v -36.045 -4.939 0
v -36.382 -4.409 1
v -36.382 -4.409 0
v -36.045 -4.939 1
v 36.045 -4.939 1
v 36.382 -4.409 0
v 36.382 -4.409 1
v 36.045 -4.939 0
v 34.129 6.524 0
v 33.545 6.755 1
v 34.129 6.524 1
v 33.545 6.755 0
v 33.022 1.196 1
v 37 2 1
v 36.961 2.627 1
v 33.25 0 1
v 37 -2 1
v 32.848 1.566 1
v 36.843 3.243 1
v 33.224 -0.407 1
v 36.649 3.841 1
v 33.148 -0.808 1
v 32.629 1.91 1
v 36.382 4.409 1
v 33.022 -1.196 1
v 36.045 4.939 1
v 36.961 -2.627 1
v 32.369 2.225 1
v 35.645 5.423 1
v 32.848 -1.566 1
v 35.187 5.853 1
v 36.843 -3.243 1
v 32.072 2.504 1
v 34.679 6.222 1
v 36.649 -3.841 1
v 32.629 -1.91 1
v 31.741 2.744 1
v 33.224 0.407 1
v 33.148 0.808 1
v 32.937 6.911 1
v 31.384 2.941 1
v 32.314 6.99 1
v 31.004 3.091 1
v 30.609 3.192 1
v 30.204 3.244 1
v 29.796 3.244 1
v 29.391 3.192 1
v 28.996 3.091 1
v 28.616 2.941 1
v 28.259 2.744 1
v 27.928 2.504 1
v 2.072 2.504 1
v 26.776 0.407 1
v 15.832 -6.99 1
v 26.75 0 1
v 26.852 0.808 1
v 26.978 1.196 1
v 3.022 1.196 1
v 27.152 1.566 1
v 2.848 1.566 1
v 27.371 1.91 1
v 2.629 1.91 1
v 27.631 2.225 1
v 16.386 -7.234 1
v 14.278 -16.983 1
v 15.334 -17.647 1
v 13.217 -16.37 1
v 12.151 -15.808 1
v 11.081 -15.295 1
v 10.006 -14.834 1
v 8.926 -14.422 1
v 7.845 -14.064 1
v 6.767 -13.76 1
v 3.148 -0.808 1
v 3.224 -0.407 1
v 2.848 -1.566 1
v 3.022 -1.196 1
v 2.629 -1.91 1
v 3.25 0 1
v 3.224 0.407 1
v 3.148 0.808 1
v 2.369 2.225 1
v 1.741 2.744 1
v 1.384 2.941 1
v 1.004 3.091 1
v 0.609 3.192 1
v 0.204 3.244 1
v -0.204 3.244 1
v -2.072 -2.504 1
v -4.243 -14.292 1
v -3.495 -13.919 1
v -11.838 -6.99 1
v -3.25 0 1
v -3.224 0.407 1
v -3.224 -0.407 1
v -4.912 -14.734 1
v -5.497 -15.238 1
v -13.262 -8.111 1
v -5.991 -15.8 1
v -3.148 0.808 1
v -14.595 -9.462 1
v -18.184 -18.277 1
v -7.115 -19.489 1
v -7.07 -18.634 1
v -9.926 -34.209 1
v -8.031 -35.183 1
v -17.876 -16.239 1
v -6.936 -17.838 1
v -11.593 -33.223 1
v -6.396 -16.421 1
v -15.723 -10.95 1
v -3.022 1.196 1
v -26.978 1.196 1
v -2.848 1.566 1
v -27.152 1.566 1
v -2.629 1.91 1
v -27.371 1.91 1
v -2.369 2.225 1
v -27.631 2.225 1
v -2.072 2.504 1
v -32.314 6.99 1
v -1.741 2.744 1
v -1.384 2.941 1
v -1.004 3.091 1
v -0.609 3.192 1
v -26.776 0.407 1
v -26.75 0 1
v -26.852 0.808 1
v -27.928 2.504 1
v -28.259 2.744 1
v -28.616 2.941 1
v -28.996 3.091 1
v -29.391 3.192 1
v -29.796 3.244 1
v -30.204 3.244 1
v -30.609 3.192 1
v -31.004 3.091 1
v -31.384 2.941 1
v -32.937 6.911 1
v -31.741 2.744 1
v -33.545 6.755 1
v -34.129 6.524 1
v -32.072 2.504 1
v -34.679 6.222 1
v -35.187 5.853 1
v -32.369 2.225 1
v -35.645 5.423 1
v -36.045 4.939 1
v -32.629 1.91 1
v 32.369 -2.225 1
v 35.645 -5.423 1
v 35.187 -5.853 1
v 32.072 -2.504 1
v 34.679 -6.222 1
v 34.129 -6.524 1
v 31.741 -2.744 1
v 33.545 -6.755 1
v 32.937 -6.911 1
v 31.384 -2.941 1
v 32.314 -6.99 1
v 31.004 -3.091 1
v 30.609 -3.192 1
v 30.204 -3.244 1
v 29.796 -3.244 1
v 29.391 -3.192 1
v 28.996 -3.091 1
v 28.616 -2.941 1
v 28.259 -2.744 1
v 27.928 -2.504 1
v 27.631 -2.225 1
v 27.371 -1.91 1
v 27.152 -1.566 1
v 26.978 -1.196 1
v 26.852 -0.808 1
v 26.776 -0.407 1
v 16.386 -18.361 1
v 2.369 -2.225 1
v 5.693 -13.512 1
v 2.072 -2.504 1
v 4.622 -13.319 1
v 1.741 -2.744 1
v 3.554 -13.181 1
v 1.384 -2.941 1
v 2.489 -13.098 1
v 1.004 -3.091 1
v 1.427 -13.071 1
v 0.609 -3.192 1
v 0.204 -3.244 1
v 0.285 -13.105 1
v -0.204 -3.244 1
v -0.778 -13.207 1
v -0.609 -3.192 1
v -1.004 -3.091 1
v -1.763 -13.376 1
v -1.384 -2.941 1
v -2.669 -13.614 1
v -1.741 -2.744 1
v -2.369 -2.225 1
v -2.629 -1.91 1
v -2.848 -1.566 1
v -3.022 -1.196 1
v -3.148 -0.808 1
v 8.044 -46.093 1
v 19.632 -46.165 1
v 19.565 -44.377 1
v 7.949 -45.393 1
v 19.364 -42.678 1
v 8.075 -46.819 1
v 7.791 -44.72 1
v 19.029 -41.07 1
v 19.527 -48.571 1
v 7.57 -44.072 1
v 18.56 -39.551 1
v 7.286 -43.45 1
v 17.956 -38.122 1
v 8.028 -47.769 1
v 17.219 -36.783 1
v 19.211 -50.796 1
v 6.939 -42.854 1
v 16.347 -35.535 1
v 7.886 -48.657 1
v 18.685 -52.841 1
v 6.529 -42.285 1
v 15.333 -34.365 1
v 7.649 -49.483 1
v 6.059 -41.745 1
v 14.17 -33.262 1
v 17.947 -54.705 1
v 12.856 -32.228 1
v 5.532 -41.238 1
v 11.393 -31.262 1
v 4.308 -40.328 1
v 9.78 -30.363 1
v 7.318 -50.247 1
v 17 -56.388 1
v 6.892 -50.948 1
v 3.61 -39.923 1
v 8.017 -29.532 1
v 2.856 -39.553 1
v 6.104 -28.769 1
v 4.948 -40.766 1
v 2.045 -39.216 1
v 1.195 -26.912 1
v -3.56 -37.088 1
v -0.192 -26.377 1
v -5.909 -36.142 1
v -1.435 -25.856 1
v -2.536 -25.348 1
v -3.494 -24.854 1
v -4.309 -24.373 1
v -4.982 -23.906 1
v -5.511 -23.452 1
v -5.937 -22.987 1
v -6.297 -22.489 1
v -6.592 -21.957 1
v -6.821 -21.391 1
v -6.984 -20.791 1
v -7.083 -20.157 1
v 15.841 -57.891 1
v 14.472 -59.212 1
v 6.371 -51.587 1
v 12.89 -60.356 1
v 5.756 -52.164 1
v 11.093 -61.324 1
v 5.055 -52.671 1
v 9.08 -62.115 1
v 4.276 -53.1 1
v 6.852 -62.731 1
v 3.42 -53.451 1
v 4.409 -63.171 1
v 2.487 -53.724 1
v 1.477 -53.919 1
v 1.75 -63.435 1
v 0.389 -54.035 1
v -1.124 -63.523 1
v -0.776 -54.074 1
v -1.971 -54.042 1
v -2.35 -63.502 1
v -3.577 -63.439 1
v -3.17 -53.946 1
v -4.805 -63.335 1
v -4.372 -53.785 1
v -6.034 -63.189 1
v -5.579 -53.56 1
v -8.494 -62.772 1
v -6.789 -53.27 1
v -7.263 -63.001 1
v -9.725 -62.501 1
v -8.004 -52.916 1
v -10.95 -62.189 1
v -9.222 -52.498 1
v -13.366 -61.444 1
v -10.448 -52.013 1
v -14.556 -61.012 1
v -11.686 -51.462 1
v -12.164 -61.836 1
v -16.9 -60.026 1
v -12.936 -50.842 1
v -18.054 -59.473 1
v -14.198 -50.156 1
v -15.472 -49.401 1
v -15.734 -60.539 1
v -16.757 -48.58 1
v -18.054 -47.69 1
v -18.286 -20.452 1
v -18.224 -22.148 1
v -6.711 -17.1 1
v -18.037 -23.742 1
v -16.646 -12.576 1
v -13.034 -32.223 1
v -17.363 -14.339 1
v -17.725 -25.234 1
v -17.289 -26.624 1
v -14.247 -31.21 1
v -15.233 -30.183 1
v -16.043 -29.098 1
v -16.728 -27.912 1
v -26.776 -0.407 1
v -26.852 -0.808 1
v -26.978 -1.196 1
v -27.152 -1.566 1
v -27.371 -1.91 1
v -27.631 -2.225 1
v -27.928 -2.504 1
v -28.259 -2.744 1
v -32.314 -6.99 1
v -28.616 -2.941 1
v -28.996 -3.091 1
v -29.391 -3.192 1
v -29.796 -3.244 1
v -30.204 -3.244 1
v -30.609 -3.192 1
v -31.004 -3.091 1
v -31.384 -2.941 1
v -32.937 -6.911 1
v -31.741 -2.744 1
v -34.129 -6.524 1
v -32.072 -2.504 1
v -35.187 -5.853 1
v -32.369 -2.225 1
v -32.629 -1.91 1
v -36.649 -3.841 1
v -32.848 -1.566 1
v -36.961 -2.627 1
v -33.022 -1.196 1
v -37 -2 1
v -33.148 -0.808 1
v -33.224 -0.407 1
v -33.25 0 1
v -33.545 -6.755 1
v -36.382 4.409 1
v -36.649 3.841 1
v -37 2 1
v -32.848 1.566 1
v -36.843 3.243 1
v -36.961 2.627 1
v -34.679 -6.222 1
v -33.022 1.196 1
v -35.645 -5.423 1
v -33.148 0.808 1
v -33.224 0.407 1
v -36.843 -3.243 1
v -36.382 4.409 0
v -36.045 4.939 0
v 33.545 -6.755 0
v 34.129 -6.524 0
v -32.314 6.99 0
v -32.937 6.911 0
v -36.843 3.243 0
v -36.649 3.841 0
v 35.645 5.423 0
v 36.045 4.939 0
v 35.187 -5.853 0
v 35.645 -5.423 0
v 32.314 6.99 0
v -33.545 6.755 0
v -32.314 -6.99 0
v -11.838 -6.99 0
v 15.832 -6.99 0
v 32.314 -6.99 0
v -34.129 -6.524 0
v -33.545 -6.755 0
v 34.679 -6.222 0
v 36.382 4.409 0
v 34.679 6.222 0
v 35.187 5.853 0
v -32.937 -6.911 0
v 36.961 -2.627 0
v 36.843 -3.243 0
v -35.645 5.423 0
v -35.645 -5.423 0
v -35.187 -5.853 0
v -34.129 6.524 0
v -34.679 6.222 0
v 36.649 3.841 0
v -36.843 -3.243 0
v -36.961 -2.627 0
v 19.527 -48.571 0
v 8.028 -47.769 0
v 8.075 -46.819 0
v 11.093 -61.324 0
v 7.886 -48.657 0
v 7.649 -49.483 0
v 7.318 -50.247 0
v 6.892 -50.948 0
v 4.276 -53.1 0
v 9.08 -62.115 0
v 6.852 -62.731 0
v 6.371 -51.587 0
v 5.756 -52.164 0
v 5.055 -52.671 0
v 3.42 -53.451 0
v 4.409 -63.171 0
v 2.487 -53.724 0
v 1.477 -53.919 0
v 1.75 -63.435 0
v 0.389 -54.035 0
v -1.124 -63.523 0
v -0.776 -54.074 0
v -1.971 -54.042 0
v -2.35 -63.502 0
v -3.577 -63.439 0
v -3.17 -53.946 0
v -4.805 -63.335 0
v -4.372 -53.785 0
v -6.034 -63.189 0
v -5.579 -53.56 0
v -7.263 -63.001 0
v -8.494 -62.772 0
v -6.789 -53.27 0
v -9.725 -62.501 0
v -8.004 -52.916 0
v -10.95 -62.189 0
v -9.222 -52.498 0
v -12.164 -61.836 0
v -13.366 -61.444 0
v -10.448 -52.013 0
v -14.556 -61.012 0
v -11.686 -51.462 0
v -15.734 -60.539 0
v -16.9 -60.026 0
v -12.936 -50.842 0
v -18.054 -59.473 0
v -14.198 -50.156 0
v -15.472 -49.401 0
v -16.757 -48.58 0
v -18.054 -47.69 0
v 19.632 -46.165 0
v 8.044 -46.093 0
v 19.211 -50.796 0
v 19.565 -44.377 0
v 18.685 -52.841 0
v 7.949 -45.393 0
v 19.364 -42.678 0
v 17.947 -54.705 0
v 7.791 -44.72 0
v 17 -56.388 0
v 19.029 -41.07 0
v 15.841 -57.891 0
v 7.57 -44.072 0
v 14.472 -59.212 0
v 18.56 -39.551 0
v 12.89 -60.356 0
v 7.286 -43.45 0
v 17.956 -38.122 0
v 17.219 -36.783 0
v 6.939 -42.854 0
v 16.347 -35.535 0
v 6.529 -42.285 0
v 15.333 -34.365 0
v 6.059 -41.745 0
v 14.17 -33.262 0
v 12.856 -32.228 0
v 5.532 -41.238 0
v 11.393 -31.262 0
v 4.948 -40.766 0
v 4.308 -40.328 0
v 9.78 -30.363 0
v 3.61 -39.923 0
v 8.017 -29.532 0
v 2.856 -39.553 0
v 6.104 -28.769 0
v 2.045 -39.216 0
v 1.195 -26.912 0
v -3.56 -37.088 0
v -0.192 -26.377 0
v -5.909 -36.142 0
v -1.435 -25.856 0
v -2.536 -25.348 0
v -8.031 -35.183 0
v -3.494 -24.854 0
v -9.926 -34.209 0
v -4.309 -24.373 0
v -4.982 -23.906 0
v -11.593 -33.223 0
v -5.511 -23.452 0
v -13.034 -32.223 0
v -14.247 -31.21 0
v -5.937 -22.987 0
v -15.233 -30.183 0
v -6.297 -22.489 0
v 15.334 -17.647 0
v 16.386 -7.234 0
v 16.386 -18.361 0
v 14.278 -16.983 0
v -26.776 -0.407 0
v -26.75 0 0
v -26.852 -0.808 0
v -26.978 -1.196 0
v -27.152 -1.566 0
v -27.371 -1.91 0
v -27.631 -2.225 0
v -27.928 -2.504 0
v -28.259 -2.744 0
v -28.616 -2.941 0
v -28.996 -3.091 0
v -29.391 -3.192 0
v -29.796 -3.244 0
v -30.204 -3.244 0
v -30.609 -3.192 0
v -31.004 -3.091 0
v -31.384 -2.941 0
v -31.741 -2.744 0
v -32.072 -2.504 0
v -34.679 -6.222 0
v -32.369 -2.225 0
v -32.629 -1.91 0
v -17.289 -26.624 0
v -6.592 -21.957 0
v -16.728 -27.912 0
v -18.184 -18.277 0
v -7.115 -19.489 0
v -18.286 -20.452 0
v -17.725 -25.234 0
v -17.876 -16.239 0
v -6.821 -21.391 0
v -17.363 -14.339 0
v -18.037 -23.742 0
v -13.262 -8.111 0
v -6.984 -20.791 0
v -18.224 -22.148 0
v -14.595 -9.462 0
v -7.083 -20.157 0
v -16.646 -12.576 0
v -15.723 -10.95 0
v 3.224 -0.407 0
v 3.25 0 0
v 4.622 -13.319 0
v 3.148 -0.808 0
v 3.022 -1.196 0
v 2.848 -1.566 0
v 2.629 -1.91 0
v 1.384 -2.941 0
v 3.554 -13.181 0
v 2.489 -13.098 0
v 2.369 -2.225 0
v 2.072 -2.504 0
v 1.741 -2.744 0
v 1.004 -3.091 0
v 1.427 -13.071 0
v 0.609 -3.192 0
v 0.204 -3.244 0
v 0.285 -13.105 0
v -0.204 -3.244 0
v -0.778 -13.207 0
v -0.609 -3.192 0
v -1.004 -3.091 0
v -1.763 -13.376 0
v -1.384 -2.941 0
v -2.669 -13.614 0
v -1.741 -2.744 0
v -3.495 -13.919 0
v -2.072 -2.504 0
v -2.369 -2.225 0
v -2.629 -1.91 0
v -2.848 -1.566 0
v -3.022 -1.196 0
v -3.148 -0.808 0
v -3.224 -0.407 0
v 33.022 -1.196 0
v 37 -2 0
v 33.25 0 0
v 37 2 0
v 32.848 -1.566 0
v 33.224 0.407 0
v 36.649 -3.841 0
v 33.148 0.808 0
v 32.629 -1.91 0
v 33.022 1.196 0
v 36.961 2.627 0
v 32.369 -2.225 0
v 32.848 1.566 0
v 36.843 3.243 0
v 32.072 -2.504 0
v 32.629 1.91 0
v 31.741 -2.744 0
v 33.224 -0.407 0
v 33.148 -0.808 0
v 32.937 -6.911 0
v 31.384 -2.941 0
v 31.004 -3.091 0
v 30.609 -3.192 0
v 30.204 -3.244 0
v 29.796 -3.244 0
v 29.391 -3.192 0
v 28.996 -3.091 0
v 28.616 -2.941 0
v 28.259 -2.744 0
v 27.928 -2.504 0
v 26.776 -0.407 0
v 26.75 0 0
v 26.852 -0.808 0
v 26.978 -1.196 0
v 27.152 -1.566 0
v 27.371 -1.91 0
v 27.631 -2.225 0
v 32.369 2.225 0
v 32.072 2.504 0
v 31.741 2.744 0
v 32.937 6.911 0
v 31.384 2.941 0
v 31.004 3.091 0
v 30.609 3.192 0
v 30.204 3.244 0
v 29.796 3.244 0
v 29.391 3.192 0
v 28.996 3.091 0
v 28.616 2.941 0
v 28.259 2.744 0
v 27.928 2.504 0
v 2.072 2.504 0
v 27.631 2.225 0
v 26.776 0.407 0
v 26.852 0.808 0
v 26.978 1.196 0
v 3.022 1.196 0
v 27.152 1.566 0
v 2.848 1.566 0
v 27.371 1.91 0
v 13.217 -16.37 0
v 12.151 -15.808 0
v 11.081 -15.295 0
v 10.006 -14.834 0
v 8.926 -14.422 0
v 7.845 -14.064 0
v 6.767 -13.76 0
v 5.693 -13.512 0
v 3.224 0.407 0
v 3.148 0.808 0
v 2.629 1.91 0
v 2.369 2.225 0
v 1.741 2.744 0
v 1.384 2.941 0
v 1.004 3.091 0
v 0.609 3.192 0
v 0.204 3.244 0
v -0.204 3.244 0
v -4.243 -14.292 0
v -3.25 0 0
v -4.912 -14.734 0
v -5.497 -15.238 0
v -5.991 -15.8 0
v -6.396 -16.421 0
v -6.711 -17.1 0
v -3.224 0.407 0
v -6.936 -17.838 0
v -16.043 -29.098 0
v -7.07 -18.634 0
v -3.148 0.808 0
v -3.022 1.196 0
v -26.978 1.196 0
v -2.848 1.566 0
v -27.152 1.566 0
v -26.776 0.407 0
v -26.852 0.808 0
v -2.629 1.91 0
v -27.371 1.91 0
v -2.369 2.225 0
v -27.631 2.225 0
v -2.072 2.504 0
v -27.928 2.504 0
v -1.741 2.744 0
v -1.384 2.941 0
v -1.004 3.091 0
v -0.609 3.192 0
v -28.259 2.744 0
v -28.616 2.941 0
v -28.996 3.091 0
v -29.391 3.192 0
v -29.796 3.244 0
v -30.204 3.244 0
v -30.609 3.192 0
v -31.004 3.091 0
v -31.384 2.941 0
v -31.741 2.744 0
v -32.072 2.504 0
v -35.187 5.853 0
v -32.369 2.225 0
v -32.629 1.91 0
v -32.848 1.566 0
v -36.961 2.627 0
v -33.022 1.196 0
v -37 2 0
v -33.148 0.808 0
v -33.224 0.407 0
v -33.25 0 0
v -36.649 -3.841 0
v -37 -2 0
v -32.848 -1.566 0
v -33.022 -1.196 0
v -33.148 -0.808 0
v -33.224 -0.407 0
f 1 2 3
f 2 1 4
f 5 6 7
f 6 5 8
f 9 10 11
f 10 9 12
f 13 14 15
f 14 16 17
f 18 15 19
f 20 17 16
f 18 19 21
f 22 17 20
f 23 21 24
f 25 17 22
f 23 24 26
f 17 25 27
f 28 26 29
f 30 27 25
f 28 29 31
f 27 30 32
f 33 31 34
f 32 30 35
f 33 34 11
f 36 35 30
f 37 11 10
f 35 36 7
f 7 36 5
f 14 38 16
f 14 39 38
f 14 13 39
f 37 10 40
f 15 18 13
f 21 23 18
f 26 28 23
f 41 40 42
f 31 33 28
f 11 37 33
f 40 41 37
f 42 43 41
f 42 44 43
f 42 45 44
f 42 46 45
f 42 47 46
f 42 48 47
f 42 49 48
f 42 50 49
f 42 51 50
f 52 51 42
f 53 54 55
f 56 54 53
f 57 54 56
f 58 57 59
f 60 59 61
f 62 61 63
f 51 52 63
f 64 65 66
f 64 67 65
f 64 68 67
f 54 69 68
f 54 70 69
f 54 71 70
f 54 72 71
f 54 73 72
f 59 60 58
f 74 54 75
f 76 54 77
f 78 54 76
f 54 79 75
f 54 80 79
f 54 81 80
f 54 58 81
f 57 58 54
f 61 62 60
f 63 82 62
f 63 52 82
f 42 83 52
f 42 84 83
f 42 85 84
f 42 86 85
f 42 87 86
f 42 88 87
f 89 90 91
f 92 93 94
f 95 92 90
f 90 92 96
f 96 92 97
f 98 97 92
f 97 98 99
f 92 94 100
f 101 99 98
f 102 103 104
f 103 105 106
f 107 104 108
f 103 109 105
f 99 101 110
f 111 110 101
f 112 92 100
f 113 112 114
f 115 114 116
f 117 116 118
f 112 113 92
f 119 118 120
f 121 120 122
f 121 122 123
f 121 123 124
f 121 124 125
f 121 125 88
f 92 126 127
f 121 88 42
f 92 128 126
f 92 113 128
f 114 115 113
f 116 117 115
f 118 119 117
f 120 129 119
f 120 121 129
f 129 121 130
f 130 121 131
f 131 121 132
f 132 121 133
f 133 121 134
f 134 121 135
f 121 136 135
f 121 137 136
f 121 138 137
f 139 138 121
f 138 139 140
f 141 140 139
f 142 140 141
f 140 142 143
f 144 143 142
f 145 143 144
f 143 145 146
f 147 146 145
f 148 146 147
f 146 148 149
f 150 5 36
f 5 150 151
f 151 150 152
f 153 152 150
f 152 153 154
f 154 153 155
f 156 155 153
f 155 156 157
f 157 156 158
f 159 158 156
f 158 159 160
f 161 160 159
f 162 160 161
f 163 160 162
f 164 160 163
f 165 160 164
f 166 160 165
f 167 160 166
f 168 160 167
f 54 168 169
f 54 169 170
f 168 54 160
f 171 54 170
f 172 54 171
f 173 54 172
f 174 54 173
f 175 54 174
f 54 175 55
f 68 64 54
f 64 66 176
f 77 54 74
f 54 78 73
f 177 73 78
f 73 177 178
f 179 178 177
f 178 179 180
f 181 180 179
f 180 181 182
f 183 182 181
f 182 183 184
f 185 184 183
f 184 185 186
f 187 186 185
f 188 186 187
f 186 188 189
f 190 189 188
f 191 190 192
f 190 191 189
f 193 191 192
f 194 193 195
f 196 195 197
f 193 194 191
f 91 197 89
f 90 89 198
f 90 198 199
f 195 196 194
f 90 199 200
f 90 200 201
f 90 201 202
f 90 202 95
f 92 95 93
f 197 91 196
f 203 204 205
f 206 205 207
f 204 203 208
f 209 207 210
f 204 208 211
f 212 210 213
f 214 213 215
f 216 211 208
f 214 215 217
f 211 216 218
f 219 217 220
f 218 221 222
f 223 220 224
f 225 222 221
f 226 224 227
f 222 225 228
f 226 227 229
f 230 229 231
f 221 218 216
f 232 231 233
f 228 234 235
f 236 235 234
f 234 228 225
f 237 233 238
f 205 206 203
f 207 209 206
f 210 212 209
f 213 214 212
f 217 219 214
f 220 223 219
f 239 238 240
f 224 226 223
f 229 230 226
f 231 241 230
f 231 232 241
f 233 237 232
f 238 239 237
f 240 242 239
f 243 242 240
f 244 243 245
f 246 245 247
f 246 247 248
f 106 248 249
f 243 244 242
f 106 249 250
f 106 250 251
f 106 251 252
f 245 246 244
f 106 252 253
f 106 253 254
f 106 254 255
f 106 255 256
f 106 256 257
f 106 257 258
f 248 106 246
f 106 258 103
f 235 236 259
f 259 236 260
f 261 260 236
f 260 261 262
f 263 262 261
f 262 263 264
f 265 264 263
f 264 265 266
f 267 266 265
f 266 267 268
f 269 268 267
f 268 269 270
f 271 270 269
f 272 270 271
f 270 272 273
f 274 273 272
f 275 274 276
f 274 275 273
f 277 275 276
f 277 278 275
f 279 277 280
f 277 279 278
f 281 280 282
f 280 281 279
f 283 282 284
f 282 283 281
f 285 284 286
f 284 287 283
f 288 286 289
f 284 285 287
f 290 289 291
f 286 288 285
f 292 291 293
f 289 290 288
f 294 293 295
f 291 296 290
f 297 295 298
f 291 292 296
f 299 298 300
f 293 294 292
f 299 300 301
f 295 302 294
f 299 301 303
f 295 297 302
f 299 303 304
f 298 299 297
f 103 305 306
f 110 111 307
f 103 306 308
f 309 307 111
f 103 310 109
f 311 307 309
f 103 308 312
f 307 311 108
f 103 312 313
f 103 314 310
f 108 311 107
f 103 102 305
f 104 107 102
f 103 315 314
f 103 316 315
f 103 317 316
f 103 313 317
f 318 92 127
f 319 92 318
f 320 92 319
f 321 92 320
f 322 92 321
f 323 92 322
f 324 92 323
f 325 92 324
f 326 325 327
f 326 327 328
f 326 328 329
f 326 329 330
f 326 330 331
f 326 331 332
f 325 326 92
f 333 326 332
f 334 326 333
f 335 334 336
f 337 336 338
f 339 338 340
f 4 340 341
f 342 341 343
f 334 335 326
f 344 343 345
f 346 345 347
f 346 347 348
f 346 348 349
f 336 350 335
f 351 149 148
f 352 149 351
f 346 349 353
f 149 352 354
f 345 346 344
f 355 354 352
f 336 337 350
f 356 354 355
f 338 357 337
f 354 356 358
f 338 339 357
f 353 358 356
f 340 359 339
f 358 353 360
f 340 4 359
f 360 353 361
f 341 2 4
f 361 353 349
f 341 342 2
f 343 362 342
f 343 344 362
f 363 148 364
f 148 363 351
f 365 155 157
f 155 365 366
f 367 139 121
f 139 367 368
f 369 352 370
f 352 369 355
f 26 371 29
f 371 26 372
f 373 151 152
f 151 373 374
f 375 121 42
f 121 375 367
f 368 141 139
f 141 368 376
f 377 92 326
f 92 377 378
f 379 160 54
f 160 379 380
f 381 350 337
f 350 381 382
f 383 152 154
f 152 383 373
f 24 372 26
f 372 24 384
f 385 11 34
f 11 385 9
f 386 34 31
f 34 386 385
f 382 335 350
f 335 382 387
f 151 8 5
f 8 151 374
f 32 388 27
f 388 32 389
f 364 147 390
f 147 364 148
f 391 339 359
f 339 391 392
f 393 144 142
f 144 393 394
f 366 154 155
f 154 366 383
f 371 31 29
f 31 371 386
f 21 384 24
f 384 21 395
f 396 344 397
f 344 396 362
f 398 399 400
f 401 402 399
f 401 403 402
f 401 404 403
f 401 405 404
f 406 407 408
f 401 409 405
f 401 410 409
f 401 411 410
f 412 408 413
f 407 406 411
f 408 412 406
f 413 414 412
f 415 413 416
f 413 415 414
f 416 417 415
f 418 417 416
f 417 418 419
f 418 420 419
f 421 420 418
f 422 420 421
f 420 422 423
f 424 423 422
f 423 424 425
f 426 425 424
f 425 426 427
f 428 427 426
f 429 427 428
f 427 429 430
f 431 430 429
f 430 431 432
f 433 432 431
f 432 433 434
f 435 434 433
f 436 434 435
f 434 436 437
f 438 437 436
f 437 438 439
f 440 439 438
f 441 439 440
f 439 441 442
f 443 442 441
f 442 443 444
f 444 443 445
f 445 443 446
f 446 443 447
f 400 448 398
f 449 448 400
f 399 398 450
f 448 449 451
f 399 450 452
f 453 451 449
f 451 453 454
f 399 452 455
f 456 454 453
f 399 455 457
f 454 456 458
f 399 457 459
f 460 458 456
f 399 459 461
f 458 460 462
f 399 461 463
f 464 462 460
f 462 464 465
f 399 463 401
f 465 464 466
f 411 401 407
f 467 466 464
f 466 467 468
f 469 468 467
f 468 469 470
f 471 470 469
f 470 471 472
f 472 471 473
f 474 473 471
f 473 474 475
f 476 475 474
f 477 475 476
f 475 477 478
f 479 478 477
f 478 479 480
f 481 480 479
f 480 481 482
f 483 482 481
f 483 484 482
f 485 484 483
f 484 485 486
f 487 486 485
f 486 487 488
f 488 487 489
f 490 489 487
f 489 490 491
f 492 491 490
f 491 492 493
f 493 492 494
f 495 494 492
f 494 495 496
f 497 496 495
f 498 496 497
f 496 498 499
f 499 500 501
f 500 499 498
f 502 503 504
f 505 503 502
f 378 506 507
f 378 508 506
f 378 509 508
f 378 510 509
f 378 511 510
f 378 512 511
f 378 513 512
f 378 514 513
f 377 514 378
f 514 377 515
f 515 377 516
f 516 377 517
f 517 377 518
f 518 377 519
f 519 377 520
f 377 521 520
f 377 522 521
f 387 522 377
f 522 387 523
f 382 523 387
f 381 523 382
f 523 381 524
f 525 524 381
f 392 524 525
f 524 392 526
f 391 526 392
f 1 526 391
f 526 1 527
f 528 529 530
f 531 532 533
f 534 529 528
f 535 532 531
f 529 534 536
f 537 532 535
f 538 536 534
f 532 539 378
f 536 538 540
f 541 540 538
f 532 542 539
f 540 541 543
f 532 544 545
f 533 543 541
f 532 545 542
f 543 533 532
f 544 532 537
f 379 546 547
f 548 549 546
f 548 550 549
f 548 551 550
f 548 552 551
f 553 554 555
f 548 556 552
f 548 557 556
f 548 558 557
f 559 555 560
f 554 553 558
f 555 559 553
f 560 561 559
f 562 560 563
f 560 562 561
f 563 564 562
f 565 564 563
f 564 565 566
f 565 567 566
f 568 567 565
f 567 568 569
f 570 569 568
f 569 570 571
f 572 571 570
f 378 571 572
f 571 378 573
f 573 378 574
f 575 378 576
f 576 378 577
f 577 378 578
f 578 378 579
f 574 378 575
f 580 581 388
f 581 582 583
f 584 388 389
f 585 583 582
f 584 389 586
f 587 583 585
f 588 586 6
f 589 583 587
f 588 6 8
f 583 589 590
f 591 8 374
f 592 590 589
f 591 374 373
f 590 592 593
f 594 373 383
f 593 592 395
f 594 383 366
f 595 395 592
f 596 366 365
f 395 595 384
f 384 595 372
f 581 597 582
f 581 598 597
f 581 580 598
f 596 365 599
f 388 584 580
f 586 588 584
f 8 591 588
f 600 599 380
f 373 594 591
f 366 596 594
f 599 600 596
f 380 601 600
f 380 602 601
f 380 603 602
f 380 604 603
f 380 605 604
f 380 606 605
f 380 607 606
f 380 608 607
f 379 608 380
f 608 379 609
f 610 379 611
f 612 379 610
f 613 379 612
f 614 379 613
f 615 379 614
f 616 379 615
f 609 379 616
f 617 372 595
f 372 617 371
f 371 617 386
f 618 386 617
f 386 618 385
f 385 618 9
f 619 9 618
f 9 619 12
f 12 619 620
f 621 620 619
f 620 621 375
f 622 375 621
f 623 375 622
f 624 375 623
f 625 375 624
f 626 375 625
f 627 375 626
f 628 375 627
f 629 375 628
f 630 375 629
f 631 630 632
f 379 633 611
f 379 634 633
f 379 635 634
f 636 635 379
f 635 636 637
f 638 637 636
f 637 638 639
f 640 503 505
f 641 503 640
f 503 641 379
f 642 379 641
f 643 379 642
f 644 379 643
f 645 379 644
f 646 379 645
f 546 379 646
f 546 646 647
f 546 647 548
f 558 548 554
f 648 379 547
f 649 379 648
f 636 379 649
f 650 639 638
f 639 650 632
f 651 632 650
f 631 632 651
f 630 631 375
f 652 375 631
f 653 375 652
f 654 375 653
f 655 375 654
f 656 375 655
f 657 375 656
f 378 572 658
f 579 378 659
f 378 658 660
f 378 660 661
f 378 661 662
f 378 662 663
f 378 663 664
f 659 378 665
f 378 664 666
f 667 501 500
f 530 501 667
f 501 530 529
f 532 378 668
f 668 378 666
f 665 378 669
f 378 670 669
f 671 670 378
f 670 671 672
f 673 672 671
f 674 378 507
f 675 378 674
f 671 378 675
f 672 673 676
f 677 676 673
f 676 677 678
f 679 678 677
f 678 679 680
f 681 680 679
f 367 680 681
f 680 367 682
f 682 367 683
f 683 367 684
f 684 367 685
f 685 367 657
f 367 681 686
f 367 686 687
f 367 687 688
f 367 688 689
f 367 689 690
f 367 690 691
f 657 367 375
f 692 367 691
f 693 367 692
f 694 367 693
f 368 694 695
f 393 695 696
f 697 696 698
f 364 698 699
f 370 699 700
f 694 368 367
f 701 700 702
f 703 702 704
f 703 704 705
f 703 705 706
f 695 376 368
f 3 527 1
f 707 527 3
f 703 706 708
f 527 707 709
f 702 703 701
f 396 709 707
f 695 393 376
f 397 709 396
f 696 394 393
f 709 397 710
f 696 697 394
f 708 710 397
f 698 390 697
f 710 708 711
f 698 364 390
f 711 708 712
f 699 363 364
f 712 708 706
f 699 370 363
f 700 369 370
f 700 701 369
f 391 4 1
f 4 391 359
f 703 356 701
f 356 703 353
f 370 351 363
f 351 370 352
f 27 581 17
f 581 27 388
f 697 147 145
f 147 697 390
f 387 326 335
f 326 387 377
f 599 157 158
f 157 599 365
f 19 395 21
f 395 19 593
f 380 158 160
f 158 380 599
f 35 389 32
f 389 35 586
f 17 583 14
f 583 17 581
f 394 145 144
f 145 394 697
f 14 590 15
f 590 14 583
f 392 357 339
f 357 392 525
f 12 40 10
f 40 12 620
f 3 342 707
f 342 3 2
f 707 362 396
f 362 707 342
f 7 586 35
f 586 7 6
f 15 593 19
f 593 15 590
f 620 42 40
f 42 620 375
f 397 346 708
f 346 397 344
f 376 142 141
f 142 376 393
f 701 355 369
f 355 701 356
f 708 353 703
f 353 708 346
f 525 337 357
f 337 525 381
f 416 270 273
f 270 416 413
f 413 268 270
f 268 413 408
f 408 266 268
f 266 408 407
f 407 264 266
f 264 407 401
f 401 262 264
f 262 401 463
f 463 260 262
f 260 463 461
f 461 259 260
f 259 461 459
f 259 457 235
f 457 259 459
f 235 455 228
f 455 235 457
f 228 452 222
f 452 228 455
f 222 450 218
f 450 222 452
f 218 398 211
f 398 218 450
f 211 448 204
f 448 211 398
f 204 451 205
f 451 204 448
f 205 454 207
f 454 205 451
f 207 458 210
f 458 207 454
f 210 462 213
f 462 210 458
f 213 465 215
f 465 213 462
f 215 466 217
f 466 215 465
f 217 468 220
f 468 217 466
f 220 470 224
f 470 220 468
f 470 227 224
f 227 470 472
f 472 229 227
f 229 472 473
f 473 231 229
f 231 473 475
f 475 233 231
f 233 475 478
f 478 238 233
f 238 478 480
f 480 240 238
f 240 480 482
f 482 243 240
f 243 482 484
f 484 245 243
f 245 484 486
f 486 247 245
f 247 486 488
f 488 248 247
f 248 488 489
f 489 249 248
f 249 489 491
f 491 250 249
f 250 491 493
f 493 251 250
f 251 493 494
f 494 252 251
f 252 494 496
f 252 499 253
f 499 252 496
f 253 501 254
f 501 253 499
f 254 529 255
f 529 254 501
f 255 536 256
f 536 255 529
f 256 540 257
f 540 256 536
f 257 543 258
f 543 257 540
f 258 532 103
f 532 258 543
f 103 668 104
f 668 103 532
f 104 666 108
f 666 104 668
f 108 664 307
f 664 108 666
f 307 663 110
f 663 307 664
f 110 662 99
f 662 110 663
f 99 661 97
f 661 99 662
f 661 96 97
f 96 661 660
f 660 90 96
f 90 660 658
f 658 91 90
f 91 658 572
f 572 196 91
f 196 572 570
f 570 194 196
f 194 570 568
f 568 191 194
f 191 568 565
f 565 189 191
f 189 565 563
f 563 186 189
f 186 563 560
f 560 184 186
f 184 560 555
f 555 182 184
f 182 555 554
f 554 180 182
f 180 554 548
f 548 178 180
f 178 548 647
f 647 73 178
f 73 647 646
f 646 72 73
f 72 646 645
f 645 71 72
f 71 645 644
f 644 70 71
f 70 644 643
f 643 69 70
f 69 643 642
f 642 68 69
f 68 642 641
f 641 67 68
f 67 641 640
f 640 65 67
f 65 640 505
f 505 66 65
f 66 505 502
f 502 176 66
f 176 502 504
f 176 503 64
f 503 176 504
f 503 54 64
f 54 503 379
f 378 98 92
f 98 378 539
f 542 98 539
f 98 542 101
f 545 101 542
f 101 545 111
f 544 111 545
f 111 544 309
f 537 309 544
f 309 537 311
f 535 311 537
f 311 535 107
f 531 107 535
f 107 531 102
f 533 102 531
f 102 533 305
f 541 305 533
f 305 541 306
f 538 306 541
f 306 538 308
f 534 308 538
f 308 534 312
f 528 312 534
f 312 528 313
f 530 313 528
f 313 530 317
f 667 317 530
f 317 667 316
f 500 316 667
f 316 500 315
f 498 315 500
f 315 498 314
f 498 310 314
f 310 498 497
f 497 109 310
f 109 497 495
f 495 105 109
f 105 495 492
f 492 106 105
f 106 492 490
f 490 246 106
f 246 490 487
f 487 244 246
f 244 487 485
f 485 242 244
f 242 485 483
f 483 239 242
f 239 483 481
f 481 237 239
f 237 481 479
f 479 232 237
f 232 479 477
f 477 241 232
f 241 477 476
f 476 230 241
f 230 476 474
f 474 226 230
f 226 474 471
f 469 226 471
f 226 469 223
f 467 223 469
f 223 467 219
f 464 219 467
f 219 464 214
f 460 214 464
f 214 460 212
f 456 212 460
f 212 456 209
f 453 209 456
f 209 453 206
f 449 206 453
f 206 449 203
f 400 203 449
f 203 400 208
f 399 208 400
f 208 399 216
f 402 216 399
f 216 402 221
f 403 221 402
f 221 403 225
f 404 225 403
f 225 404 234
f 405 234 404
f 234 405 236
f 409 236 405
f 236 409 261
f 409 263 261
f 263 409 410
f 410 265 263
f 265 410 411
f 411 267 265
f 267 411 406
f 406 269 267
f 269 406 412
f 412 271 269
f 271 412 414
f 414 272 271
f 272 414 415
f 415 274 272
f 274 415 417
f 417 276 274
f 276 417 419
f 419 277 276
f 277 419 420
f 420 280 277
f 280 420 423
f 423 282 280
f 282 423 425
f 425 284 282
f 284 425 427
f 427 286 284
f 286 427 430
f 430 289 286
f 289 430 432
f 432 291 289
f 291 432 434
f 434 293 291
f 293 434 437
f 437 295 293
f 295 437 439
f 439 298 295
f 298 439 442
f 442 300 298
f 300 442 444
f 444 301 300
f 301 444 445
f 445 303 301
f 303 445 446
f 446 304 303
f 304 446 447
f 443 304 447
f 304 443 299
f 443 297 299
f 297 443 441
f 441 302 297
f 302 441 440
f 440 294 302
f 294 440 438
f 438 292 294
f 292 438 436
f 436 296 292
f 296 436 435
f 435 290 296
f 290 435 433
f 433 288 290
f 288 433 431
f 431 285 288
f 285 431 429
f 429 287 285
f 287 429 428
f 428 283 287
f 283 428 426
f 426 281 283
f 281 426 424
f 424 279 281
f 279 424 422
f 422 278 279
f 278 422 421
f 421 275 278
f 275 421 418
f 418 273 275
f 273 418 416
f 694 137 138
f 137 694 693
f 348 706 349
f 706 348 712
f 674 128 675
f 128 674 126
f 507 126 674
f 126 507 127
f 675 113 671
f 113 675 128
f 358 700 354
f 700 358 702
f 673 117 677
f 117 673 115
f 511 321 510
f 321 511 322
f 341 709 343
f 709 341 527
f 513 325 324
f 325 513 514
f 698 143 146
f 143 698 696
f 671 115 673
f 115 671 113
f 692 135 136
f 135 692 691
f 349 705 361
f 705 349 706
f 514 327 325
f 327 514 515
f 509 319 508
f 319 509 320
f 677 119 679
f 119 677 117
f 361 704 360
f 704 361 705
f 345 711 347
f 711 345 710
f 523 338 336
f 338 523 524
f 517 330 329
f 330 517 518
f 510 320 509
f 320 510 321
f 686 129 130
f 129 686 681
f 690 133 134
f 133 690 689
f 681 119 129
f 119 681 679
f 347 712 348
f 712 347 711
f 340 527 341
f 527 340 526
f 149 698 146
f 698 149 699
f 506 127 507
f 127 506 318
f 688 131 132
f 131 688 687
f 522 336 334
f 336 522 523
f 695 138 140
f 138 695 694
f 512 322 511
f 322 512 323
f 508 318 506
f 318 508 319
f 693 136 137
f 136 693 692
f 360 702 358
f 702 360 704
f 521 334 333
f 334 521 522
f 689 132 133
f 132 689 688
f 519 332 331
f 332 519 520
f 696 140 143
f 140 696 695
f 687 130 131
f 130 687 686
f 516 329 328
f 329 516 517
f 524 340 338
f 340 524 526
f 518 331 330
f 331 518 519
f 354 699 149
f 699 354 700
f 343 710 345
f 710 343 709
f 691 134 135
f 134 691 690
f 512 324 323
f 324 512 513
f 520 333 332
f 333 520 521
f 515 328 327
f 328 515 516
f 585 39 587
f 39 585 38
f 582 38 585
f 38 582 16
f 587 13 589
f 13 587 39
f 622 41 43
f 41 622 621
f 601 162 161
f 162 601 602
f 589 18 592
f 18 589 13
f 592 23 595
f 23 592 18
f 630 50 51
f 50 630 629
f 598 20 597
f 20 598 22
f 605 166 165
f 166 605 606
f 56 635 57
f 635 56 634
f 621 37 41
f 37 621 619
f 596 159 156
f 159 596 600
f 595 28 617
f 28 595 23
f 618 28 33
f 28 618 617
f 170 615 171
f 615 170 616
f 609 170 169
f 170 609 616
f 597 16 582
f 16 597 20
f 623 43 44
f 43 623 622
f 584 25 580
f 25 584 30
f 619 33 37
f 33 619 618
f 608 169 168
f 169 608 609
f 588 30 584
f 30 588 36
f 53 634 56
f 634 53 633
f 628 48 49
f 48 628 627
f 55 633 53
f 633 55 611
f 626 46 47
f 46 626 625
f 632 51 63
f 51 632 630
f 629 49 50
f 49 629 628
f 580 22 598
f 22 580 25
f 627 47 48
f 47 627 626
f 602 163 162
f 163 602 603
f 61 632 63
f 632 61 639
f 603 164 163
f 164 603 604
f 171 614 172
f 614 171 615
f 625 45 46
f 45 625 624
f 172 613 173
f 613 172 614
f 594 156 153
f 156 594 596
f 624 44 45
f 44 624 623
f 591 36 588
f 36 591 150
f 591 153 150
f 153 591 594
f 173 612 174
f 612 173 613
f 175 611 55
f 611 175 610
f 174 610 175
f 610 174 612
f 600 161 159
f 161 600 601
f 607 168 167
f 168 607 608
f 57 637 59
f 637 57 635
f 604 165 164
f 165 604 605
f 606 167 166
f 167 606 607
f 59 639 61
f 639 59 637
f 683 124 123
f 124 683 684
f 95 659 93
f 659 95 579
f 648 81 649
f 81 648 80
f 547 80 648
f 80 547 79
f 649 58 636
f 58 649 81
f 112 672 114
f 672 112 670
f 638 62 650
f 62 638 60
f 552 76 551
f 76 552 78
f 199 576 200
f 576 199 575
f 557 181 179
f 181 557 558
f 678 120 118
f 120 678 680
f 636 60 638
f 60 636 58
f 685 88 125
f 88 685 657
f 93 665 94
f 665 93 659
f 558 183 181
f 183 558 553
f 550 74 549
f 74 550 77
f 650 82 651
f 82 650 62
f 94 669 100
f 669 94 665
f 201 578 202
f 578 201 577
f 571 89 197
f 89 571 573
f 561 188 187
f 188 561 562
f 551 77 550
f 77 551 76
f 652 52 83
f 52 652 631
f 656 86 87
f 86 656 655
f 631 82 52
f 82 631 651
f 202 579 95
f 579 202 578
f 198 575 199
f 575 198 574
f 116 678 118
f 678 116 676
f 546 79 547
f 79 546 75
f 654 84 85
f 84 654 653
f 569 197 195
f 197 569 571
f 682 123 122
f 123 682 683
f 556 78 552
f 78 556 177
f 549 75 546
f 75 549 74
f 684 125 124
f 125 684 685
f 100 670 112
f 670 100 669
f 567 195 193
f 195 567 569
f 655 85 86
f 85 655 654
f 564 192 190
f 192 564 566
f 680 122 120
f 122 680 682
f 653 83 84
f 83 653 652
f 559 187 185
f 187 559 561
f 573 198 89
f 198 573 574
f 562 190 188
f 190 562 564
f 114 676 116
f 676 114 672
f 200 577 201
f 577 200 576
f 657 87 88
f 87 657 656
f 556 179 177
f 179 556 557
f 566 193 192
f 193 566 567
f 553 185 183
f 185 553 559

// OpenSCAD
$fn = 50;


difference() {
	union() {
		translate(v = [0, 0, 0]) {
			rotate(a = [0, 0, 0]) {
				hull() {
					translate(v = [-32.0000000000, 2.0000000000, 0]) {
						rotate(a = [0, 0, 0]) {
							translate(v = [0, 0, 0]) {
								rotate(a = [0, 0, 0]) {
									cylinder(h = 1, r = 5);
								}
							}
						}
					}
					translate(v = [32.0000000000, 2.0000000000, 0]) {
						rotate(a = [0, 0, 0]) {
							translate(v = [0, 0, 0]) {
								rotate(a = [0, 0, 0]) {
									cylinder(h = 1, r = 5);
								}
							}
						}
					}
					translate(v = [-32.0000000000, -2.0000000000, 0]) {
						rotate(a = [0, 0, 0]) {
							translate(v = [0, 0, 0]) {
								rotate(a = [0, 0, 0]) {
									cylinder(h = 1, r = 5);
								}
							}
						}
					}
					translate(v = [32.0000000000, -2.0000000000, 0]) {
						rotate(a = [0, 0, 0]) {
							translate(v = [0, 0, 0]) {
								rotate(a = [0, 0, 0]) {
									cylinder(h = 1, r = 5);
								}
							}
						}
					}
				}
			}
		}
		translate(v = [0, -5, 0]) {
			rotate(a = [0, 0, 0]) {
				linear_extrude(height = 1) {
					text(font = "DejaVu Sans Mono:style=Bold", halign = "center", size = 57.0000000000, text = "S", valign = "top");
				}
			}
		}
	}
	union() {
		translate(v = [-30.0000000000, 0.0000000000, -125.0000000000]) {
			rotate(a = [0, 0, 0]) {
				cylinder(h = 250, r = 3.2500000000);
			}
		}
		translate(v = [30.0000000000, 0.0000000000, -125.0000000000]) {
			rotate(a = [0, 0, 0]) {
				cylinder(h = 250, r = 3.2500000000);
			}
		}
		translate(v = [30.0000000000, 0.0000000000, -125.0000000000]) {
			rotate(a = [0, 0, 0]) {
				cylinder(h = 250, r = 3.2500000000);
			}
		}
		translate(v = [0, 0, -125.0000000000]) {
			rotate(a = [0, 0, 0]) {
				cylinder(h = 250, r = 3.2500000000);
			}
		}
	}
}
